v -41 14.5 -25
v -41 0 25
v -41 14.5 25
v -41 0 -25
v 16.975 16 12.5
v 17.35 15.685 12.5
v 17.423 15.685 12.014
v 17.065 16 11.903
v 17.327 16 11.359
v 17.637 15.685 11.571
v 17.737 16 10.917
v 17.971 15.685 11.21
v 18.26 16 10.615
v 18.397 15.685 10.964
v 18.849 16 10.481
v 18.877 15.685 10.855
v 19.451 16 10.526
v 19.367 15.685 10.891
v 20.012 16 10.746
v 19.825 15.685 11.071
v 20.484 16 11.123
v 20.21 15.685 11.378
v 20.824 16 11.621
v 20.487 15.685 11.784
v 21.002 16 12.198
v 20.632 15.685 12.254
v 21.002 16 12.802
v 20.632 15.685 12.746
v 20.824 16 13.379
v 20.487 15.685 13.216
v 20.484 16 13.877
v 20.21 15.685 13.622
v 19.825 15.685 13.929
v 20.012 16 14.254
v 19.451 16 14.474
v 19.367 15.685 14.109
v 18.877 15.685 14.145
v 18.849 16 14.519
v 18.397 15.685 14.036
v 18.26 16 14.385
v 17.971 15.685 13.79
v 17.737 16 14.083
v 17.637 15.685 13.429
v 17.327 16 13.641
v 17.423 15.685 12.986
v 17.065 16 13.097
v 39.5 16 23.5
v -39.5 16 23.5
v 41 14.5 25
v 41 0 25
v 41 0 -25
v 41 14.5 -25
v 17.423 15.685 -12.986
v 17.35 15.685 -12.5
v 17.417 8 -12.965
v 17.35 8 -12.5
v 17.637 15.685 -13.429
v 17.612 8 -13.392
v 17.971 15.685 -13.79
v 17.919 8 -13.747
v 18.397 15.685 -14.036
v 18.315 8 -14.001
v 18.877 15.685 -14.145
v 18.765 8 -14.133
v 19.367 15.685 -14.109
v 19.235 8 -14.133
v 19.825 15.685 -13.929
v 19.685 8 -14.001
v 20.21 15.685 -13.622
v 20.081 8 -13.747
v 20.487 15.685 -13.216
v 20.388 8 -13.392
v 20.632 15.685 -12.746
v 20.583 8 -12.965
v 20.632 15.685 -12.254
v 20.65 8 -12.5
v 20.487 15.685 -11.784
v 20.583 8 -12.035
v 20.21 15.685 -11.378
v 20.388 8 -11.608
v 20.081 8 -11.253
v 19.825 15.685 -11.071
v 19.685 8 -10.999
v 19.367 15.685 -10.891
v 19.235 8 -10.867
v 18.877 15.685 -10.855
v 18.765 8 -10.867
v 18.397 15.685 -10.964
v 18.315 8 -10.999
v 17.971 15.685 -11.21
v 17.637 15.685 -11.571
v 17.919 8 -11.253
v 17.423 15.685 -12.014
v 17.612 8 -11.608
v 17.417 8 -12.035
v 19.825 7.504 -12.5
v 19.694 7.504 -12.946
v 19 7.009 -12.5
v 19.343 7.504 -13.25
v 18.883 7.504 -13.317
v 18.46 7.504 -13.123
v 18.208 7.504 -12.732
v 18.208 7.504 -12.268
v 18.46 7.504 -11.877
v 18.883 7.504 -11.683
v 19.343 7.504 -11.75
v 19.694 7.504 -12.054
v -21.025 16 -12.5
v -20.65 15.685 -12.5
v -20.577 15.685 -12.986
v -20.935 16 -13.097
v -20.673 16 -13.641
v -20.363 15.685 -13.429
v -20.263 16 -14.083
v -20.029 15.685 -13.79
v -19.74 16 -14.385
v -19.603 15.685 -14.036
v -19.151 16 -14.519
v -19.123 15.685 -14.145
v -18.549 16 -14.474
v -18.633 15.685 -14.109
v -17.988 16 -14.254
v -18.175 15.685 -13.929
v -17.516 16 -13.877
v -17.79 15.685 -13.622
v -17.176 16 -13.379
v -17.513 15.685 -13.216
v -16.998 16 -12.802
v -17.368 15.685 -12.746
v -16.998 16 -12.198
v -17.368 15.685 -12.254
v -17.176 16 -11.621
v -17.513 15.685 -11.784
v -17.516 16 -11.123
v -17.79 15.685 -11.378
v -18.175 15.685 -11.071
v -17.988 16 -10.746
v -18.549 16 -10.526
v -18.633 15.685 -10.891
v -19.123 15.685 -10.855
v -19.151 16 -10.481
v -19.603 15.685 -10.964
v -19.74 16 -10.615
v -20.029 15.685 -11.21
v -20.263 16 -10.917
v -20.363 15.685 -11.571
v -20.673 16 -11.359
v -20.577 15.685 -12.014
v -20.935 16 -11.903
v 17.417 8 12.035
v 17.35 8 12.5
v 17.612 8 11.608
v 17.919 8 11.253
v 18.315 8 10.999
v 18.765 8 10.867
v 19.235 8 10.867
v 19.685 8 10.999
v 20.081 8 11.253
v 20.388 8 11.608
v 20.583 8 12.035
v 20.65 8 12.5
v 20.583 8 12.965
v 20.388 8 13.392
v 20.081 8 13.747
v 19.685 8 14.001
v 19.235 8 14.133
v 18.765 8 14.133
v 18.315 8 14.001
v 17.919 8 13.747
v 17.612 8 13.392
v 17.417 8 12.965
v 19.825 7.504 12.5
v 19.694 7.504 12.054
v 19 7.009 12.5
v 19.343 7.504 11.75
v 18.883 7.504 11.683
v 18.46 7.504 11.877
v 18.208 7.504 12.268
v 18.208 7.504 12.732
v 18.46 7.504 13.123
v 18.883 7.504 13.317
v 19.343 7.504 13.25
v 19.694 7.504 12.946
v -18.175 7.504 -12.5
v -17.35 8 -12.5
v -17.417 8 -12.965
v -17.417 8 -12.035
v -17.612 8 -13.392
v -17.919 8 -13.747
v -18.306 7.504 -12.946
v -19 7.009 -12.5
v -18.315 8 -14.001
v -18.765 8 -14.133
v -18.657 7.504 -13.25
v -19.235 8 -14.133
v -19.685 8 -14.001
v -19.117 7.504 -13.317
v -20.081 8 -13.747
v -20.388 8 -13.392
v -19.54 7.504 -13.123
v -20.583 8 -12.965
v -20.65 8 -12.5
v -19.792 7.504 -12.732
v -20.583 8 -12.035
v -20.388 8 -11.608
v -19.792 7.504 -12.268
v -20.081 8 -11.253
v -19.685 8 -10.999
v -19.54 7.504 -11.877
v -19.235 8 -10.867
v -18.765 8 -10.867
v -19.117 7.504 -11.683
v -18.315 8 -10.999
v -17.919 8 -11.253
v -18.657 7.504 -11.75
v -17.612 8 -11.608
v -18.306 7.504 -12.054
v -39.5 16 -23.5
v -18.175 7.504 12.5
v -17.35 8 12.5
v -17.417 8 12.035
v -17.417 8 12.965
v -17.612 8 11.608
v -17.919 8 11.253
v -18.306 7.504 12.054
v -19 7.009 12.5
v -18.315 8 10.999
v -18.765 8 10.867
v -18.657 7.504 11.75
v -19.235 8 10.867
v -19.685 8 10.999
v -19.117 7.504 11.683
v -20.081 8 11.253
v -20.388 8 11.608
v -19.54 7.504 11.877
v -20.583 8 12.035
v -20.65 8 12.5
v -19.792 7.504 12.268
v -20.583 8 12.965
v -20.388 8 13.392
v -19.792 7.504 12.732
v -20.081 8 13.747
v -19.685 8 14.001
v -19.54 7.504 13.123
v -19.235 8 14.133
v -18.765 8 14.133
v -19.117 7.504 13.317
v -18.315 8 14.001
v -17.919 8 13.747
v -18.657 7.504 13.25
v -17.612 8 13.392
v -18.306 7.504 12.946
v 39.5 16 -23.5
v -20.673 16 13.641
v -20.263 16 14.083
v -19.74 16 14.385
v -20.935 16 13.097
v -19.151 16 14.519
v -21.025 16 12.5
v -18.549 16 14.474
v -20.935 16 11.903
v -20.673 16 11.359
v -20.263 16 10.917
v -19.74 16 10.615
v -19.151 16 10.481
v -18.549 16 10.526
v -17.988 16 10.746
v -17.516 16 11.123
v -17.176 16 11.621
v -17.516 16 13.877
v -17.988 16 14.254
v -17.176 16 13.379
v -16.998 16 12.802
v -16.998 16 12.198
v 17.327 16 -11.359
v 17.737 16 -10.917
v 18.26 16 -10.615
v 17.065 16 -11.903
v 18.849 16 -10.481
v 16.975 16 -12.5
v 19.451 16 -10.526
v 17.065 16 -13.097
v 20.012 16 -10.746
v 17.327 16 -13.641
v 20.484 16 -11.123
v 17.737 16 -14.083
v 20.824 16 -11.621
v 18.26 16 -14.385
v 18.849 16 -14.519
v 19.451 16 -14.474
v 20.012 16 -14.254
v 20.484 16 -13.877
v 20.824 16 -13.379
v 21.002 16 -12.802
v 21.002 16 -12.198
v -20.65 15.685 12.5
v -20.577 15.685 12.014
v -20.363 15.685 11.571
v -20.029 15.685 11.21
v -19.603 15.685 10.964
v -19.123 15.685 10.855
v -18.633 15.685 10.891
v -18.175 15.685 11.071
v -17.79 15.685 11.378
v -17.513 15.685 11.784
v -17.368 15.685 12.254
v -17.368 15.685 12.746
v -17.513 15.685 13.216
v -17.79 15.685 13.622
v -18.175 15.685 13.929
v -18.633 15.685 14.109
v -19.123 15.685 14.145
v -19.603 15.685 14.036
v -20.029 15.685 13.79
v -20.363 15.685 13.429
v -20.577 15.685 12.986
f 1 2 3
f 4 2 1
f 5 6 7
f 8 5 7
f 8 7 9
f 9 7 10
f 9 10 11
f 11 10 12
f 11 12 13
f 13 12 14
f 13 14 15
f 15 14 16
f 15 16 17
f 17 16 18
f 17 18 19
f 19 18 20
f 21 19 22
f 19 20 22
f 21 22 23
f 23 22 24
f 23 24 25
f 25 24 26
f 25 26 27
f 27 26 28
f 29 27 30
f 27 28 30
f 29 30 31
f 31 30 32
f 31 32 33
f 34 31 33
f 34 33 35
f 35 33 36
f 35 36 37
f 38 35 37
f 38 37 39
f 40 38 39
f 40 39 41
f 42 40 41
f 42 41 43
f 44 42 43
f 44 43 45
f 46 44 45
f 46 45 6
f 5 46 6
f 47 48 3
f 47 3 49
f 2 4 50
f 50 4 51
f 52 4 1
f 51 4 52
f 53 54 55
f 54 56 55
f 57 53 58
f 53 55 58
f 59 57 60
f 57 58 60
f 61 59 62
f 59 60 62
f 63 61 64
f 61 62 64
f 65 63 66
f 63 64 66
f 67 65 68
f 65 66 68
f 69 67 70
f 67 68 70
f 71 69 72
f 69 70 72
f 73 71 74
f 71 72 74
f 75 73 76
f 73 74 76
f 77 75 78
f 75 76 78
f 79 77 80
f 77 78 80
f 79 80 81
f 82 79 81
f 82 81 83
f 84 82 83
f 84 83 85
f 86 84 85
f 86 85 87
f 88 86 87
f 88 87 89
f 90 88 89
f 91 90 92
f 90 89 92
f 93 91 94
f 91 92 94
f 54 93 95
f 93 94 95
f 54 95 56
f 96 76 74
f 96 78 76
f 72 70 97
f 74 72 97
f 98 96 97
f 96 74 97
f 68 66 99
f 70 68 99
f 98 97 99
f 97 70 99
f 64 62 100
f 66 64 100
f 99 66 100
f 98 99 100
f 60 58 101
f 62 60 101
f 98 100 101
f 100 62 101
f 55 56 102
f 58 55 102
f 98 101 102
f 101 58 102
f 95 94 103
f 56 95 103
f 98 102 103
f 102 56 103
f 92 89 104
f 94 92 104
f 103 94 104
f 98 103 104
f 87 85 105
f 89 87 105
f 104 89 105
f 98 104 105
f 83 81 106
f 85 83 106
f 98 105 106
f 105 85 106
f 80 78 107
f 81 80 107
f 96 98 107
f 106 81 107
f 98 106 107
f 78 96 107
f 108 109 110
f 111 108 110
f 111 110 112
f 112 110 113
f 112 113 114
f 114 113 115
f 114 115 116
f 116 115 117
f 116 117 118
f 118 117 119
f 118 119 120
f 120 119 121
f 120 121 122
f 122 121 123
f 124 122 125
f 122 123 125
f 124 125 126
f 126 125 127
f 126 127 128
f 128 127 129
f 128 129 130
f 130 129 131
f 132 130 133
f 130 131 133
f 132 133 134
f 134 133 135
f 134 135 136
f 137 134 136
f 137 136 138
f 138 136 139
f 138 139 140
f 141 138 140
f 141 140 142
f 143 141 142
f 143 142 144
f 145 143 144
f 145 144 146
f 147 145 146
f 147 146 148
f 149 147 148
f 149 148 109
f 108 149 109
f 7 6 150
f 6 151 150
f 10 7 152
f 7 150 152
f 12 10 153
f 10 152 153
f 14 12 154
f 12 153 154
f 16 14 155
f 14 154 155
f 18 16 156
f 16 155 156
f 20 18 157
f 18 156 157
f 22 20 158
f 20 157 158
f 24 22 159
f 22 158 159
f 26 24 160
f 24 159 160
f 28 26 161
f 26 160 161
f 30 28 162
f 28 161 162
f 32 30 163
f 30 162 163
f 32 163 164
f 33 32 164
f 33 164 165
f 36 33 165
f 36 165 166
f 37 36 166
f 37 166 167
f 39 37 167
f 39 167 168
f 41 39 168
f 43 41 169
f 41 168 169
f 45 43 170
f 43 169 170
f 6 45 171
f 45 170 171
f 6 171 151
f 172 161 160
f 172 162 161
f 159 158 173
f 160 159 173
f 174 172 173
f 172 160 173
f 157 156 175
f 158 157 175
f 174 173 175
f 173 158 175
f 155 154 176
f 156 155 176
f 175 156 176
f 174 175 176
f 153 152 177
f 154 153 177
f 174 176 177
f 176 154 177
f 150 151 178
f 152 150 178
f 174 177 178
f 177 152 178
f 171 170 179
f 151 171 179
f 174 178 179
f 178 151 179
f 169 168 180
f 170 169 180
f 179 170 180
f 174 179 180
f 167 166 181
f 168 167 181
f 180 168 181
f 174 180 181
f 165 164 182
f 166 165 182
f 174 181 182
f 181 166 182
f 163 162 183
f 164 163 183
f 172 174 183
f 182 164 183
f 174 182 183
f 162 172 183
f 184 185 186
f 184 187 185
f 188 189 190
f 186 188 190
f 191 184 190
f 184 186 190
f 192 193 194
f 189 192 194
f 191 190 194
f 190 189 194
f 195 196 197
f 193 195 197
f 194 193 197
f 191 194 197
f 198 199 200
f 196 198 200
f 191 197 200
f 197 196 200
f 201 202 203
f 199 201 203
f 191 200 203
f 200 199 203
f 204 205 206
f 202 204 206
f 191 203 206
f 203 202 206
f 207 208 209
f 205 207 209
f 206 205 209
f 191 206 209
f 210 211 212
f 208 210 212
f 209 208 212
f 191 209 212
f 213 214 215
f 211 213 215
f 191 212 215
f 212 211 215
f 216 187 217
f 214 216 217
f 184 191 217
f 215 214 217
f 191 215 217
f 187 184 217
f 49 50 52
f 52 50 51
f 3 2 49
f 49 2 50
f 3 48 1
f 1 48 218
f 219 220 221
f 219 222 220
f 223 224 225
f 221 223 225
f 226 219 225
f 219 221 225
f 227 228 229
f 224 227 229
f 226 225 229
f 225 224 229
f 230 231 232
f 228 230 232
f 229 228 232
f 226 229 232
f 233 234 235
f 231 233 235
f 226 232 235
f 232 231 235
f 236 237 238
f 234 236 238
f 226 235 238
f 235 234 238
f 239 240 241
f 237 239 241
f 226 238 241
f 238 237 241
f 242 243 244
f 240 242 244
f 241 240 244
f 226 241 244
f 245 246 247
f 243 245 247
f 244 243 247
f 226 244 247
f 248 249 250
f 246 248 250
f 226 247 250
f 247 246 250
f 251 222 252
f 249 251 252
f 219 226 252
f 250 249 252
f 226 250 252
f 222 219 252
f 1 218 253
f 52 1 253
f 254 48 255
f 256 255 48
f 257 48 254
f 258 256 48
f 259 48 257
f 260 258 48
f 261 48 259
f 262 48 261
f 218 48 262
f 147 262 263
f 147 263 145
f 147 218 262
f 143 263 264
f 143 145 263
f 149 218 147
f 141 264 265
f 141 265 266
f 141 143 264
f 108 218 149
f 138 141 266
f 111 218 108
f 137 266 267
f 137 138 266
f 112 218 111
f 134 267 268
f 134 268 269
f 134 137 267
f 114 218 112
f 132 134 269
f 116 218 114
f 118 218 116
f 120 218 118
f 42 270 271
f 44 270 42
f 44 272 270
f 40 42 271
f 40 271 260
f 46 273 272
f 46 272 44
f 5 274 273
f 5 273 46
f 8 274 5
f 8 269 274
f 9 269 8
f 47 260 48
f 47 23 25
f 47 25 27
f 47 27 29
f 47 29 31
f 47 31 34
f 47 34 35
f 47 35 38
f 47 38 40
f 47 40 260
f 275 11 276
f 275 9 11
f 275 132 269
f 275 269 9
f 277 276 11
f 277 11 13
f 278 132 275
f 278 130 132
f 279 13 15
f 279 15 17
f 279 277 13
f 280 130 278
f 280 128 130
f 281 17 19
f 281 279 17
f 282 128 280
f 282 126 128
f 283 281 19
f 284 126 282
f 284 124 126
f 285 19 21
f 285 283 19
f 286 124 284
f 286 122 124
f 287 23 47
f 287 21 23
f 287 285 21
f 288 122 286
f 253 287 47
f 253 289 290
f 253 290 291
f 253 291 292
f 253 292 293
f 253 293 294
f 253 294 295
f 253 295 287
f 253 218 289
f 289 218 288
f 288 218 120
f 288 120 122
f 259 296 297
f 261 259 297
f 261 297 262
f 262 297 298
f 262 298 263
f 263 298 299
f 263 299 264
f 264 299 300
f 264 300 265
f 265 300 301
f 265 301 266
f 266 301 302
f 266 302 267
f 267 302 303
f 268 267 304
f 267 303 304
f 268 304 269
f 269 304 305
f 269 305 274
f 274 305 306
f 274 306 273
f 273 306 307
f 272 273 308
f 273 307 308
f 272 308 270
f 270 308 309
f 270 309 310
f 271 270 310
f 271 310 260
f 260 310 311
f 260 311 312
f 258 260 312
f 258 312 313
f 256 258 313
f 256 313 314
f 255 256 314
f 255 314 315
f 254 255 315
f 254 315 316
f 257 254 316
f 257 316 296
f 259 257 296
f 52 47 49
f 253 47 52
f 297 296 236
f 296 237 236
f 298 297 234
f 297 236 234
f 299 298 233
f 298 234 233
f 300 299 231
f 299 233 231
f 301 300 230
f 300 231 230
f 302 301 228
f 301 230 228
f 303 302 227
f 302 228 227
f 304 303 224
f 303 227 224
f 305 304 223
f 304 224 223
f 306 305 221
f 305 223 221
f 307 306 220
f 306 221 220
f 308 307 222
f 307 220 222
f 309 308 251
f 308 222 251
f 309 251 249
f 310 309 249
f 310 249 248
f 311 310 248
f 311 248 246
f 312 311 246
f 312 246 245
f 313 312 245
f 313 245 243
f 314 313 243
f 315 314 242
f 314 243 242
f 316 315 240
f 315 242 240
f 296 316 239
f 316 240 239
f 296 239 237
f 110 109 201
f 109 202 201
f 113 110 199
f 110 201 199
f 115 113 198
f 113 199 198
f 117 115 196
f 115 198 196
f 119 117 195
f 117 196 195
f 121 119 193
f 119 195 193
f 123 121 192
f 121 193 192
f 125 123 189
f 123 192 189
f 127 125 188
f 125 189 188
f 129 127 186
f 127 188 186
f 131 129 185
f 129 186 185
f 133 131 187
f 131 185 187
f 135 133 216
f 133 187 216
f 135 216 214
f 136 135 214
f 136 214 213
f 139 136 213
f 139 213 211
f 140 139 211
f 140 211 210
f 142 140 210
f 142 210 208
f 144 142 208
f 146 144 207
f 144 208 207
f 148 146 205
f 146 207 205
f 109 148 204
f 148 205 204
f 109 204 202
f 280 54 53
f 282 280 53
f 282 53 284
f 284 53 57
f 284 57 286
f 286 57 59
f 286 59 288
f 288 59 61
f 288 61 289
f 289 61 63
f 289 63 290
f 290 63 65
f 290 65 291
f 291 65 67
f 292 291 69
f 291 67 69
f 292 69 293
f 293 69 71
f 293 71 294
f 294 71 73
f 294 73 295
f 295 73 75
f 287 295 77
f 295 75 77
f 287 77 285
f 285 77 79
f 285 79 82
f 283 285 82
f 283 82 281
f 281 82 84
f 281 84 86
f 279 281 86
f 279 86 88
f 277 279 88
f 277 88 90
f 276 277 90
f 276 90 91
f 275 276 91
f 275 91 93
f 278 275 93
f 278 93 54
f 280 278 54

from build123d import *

# Parameters (mm, degrees)
SKETCH1_W                   = 82
SKETCH1_H                   = 50
BOSS_EXTRUDE1_DEPTH         = 16
CHAMFER1_SIZE               = 1.5
CHAMFER2_SIZE               = 1.5
CHAMFER3_SIZE               = 1.5
CHAMFER4_SIZE               = 1.5
M4_TAPPED_HOLE4_D           = 3.3
M4_TAPPED_HOLE4_DEPTH       = 8
M4_TAPPED_HOLE4_CSINK_D     = 4.05
M4_TAPPED_HOLE4_CSINK_ANGLE = 100
M4_TAPPED_HOLE4_TIP         = 0.991420021


with BuildPart() as part:
    # Sketch1 → Boss-Extrude1 (new body)
    with BuildSketch(Plane(origin=(0, 0, 0), x_dir=(1, 0, 0), z_dir=(0, 1, 0))):
        Rectangle(SKETCH1_W, SKETCH1_H)
    extrude(amount=BOSS_EXTRUDE1_DEPTH)

    # Chamfer1
    chamfer1_edges = [part.edges().sort_by_distance(p)[0] for p in [
        (-41, 16, 0),
    ]]
    chamfer(chamfer1_edges, length=CHAMFER1_SIZE)

    # Chamfer2
    chamfer2_edges = [part.edges().sort_by_distance(p)[0] for p in [
        (0.75, 16, 25),
    ]]
    chamfer(chamfer2_edges, length=CHAMFER2_SIZE)

    # Chamfer3
    chamfer3_edges = [part.edges().sort_by_distance(p)[0] for p in [
        (41, 16, -0.75),
    ]]
    chamfer(chamfer3_edges, length=CHAMFER3_SIZE)

    # Chamfer4
    chamfer4_edges = [part.edges().sort_by_distance(p)[0] for p in [
        (0, 16, -25),
    ]]
    chamfer(chamfer4_edges, length=CHAMFER4_SIZE)

    # M4 Tapped Hole4
    with Locations(Plane(origin=(0, 16, 0), x_dir=(1, 0, 0), z_dir=(0, 1, 0))):
        with Locations((-19, 12.5), (19, 12.5), (19, -12.5), (-19, -12.5)):
            CounterSinkHole(M4_TAPPED_HOLE4_D / 2, M4_TAPPED_HOLE4_CSINK_D / 2, depth=M4_TAPPED_HOLE4_DEPTH, counter_sink_angle=M4_TAPPED_HOLE4_CSINK_ANGLE)
            with Locations((0, 0, -(M4_TAPPED_HOLE4_DEPTH + M4_TAPPED_HOLE4_TIP / 2))):  # 118° drill point
                Cone(0, M4_TAPPED_HOLE4_D / 2, M4_TAPPED_HOLE4_TIP, mode=Mode.SUBTRACT)


solid = part.part
